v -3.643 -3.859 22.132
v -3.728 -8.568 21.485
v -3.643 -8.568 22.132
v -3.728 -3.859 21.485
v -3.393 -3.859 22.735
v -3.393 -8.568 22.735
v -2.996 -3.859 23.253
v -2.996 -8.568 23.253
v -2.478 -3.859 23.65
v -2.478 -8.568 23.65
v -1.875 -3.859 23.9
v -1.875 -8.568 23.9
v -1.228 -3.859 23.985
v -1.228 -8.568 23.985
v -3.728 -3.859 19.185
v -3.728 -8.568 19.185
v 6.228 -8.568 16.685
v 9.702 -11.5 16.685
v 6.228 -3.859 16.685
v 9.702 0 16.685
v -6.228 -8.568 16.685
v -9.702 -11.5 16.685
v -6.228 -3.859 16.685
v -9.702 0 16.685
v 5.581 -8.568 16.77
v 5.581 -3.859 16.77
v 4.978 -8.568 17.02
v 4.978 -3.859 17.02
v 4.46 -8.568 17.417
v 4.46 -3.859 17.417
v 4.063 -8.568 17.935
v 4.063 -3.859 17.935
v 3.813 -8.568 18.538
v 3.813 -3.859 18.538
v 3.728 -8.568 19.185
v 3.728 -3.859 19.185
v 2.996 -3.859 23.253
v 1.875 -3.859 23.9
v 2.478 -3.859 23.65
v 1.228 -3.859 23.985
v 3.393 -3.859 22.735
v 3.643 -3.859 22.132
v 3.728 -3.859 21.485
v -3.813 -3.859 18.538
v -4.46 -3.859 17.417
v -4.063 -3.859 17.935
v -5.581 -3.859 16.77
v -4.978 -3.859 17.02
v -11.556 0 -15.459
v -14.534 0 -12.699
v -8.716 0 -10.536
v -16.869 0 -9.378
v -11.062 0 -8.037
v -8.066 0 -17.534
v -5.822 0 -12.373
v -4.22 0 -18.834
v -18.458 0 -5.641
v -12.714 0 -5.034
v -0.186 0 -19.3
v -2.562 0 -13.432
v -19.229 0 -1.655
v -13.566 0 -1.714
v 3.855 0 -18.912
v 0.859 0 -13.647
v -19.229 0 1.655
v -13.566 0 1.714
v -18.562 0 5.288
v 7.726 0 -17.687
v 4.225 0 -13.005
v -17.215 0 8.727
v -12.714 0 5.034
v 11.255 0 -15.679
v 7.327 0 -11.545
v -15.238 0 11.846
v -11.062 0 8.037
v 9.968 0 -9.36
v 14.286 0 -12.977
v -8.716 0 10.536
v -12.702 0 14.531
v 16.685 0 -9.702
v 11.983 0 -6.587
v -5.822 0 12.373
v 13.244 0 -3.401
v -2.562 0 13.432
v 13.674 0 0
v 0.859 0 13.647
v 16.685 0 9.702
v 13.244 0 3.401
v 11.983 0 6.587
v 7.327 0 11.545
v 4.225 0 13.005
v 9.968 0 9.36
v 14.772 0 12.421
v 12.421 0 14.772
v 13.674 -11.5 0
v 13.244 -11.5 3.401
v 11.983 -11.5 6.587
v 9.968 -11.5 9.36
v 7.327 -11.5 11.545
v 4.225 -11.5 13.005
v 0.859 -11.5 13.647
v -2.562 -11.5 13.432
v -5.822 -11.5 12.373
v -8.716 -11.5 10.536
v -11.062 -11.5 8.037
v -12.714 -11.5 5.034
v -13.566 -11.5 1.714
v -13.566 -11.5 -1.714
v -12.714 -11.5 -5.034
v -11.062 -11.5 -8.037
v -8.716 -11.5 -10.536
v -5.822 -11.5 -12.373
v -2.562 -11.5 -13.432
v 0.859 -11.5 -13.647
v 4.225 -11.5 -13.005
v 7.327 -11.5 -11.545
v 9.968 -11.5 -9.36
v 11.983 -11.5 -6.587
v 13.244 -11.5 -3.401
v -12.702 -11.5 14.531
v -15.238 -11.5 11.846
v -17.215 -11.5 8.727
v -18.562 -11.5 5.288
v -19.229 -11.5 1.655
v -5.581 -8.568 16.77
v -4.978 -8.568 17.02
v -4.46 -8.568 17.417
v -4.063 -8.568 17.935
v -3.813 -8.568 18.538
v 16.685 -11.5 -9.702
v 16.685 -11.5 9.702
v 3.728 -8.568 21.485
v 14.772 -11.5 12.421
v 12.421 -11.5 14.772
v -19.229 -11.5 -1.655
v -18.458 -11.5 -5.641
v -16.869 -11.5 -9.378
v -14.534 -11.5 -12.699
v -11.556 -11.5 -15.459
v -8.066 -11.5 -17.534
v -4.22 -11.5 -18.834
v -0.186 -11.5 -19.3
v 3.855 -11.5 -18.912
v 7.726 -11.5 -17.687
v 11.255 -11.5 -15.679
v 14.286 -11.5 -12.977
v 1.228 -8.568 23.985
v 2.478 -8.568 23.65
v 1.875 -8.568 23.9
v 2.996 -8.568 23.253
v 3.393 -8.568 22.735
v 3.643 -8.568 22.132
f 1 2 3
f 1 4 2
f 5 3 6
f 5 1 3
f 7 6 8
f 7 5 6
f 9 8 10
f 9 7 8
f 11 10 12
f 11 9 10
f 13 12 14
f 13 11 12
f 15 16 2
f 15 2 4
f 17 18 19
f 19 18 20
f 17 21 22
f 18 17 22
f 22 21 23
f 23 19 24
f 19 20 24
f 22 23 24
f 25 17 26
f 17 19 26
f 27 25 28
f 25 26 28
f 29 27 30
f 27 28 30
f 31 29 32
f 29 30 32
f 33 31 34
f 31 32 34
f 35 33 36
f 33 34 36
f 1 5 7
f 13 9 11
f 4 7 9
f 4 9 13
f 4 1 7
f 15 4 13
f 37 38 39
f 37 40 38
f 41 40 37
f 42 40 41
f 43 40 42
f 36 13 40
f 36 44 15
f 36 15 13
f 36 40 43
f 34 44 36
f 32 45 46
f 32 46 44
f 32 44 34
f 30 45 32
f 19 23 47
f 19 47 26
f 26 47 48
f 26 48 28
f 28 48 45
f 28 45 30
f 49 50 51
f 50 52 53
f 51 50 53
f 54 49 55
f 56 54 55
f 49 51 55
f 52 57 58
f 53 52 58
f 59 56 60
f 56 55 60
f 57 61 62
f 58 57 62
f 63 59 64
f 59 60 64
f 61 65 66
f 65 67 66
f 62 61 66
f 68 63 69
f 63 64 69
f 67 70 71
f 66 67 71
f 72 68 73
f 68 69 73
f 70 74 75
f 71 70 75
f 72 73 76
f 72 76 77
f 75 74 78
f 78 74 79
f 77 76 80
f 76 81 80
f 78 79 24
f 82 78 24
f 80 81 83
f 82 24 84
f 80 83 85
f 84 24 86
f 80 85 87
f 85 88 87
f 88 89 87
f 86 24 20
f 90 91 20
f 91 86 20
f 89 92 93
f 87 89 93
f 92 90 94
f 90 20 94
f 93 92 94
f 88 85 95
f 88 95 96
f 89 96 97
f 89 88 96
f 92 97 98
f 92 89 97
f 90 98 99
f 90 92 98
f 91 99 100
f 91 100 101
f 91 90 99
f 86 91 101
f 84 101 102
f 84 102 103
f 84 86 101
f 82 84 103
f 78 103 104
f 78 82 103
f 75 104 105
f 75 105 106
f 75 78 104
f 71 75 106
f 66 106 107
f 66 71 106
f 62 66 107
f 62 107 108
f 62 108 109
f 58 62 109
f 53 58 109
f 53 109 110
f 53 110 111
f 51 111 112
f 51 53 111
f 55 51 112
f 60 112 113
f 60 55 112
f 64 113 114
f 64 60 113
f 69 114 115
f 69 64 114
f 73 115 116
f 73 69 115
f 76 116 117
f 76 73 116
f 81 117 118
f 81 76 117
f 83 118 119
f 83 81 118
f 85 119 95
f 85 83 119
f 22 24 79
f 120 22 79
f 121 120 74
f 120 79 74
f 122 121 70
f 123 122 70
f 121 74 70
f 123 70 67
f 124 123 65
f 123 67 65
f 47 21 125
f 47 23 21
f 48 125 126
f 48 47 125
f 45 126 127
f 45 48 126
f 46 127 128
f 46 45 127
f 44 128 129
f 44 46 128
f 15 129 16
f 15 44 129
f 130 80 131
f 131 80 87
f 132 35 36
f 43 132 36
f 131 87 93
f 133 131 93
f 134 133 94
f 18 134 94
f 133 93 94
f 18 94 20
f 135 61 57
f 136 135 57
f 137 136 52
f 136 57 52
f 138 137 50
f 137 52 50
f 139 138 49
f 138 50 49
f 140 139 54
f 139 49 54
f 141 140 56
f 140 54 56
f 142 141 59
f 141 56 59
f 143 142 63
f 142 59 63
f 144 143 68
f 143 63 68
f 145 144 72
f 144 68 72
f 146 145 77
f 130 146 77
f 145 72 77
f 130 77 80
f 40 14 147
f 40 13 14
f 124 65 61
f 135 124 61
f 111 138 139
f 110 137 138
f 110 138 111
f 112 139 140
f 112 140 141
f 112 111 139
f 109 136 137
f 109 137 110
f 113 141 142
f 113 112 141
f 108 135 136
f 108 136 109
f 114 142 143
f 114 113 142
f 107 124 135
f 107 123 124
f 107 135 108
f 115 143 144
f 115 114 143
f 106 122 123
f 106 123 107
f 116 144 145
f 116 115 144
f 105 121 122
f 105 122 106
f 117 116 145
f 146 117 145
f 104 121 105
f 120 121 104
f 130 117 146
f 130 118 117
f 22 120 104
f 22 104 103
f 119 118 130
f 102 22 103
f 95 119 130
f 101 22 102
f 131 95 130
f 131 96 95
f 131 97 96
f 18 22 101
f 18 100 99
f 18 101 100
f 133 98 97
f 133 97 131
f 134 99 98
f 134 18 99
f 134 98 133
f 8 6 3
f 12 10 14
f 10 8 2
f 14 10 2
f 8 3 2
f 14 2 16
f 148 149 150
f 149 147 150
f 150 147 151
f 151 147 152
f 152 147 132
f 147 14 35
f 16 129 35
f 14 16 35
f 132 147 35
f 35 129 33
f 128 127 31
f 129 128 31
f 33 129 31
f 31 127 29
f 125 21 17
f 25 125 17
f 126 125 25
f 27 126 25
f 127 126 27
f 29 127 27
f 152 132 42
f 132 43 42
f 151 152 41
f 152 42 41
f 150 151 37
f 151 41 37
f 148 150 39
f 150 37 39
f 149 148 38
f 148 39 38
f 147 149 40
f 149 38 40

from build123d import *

# Parameters (mm, degrees)
F0_R     = 13.67397
F1_DEPTH = 11.5
F2_W     = 7.456396
F2_H     = 4.709303
F3_DEPTH = 7.3
F4_R     = 2.5


with BuildPart() as f1:
    # F0 (on Front) → F1 (new body)
    with BuildSketch(Plane.XZ):
        with BuildLine():
            Line((-19.229384, 1.655212), (-19.229384, -1.655212))
            ThreePointArc((-19.229384, -1.655212), (-4.219579, -18.833589), (16.684931, -9.701649))
            Line((16.684931, -9.701649), (16.684931, 9.701649))
            ThreePointArc((16.684931, 9.701649), (13.647508, 13.647508), (9.701649, 16.684931))
            Line((9.701649, 16.684931), (-9.701649, 16.684931))
            ThreePointArc((-9.701649, 16.684931), (-16.301052, 10.333665), (-19.229384, 1.655212))
        make_face()
        Circle(F0_R, mode=Mode.SUBTRACT)
    extrude(amount=F1_DEPTH)

    # F2 (on face) → F3 (join)
    with BuildSketch(Plane.XY.offset(16.684931)):
        with Locations((0, -6.213662)):
            Rectangle(F2_W, F2_H)
    extrude(amount=F3_DEPTH)

    # F4
    f4_edges = [f1.edges().sort_by_distance(p)[0] for p in [
        (-3.728198, -6.213663, 23.984931),
        (3.728198, -6.213663, 23.984931),
        (3.728198, -6.213663, 16.684931),
        (-3.728198, -6.213663, 16.684931),
    ]]
    fillet(f4_edges, radius=F4_R)


solid = f1.part
